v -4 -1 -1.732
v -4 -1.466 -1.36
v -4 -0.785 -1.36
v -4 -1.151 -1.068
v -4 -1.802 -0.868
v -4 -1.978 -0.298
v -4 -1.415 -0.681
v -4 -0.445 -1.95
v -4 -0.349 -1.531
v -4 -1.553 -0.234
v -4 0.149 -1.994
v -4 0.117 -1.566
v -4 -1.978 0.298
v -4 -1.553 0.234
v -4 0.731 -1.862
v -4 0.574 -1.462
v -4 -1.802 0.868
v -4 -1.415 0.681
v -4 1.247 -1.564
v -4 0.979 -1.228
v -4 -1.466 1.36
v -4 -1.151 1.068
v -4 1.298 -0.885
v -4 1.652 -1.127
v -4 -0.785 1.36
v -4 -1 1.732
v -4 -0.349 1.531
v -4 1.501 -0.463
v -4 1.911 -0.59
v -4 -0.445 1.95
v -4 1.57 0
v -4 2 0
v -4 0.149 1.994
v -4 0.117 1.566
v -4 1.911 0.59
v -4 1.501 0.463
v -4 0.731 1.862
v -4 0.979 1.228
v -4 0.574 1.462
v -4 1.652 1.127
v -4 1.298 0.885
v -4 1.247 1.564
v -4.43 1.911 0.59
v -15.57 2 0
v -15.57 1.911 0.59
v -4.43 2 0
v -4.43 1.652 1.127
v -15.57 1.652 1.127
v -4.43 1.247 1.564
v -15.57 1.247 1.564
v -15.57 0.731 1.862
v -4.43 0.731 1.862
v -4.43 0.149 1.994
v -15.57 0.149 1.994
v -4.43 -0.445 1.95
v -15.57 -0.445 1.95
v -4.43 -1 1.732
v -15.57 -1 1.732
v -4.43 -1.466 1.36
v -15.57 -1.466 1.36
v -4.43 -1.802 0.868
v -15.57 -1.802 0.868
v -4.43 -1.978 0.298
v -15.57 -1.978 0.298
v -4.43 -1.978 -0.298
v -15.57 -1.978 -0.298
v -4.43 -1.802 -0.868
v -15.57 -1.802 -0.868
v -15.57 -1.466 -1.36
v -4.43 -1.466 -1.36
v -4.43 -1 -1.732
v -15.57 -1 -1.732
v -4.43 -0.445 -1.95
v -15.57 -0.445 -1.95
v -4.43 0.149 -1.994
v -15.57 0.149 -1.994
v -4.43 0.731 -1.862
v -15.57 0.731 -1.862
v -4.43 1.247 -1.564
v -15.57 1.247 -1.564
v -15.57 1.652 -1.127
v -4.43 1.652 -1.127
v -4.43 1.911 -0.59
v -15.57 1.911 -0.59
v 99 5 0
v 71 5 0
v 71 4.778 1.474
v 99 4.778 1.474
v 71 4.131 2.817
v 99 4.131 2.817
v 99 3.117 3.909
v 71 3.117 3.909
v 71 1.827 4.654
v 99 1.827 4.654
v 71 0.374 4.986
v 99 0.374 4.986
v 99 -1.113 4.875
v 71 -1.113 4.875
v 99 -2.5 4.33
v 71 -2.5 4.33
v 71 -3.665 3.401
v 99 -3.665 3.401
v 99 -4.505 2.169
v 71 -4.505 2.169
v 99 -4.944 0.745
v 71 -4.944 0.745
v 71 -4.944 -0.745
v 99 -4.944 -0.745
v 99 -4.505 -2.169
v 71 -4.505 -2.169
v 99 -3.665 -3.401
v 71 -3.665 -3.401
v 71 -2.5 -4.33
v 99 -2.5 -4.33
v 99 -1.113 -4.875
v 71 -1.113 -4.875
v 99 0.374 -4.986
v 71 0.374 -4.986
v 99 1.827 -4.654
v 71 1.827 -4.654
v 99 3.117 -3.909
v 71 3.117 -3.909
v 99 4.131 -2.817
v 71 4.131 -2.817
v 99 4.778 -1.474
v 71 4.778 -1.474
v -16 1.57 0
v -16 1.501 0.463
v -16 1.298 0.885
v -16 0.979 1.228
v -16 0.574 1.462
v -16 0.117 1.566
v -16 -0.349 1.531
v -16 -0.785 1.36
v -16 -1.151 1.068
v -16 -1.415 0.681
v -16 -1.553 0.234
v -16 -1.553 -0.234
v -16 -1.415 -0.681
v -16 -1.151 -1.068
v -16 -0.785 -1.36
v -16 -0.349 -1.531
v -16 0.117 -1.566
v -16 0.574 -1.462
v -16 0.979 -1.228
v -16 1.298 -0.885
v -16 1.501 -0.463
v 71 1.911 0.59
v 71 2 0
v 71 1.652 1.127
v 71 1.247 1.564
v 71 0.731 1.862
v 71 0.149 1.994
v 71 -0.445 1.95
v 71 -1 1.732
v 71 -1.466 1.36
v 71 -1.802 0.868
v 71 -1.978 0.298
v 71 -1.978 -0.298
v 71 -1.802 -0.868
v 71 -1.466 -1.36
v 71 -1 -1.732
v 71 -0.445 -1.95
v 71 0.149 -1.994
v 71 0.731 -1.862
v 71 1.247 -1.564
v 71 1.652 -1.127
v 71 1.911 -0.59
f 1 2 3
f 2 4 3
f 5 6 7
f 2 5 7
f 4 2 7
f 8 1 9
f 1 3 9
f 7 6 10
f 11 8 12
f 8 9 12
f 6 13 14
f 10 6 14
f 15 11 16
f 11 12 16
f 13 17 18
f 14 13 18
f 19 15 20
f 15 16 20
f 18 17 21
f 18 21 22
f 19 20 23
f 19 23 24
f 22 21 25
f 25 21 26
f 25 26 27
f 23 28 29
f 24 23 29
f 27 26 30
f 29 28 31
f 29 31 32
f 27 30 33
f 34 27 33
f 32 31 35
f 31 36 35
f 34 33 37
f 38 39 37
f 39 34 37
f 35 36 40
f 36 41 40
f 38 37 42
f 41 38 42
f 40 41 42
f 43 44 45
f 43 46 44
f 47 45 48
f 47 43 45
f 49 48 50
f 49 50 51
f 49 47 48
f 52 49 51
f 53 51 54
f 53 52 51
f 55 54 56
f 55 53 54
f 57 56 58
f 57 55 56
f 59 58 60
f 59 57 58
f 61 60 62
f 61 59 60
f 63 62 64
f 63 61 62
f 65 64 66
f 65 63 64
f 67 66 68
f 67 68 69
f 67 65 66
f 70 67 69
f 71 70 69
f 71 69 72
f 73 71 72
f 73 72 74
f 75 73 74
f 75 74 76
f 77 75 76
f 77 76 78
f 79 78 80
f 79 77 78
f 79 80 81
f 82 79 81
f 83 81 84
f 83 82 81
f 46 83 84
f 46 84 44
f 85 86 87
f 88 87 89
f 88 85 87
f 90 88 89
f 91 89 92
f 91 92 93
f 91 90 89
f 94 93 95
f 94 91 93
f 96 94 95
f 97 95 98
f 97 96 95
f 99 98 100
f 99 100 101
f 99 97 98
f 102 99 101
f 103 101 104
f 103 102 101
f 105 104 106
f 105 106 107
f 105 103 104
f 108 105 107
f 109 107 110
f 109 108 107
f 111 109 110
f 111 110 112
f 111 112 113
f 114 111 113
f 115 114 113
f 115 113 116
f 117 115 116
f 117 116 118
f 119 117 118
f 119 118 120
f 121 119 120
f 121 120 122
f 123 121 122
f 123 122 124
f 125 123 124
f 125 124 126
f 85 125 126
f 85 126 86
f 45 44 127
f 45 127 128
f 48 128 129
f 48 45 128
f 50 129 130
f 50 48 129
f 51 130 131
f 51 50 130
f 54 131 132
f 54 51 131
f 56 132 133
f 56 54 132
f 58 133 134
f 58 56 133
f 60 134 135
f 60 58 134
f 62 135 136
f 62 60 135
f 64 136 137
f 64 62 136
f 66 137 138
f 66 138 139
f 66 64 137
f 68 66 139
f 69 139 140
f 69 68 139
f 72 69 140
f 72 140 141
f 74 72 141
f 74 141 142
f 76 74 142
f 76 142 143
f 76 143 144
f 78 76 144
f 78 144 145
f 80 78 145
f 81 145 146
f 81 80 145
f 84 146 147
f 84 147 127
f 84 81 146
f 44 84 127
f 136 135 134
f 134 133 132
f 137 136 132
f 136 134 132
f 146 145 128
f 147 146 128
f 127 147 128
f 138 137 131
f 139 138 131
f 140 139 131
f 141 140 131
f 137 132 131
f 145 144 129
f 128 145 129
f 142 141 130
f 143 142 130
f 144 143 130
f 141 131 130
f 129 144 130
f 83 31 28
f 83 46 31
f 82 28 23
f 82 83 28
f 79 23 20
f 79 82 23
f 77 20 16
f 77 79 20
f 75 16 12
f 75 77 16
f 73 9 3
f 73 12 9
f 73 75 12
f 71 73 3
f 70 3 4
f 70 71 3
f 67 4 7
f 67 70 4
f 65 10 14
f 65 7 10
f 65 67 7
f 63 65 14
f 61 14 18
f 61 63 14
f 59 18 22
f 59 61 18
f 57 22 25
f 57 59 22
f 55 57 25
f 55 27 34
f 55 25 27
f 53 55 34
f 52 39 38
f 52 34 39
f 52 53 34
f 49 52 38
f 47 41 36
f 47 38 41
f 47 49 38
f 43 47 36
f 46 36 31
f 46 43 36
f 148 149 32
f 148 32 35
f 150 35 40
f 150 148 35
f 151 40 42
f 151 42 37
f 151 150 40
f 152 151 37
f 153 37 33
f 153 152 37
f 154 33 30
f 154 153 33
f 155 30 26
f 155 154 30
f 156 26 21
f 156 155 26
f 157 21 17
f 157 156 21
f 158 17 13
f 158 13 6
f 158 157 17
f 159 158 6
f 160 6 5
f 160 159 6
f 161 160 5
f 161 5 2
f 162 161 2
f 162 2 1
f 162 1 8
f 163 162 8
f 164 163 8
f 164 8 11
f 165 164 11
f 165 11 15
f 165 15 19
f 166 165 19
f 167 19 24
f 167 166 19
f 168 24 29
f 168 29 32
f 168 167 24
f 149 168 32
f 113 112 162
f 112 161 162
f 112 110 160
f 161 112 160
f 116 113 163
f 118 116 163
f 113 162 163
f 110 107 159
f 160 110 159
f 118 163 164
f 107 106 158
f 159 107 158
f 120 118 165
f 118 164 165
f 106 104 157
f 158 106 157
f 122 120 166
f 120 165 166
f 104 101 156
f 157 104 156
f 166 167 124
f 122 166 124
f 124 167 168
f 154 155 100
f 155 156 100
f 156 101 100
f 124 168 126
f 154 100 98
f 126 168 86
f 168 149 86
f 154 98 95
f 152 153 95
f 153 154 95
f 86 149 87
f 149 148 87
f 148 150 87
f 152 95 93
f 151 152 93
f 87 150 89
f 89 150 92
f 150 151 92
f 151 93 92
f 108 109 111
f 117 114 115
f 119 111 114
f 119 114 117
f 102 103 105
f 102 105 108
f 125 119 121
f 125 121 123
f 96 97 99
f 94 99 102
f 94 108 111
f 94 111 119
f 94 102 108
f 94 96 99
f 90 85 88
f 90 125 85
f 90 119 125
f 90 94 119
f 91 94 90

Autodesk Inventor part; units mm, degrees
sketch "Sketch_1" plane through (0, 0, 0) normal (0, 0, 1) x (1, 0, 0)
  line L0 (99, 0) -> (-4, 0)
  line L1 (-4, 0) -> (-4, 2)
  line L2 (-4, 2) -> (71, 2)
  line L3 (71, 2) -> (71, 5)
  line L4 (71, 5) -> (99, 5)
  line L5 (99, 5) -> (99, 0)
  line L6 (99, 0) -> (-4, 0)
revolve "Revolution1" add sketch "Sketch_1" angle 360 about axis through (99, 0, 0) along (1, 0, 0)
sketch "Sketch_2" plane through (0, 0, 0) normal (0, 0, 1) x (1, 0, 0)
  line L0 (-4, 0) -> (-16, 0)
  line L1 (-16, 0) -> (-16, 1.5705)
  line L2 (-16, 1.5705) -> (-15.5705, 2)
  line L3 (-15.5705, 2) -> (-4.4295, 2)
  line L4 (-4.4295, 2) -> (-4, 1.5705)
  line L5 (-4, 1.5705) -> (-4, 0)
  line L6 (-4, 0) -> (-16, 0)
revolve "Revolution2" add sketch "Sketch_2" angle 360 about axis through (-4, 0, 0) along (1, 0, 0)
thread "Thread1" size "M4x0.7" class "6g" standard "ISO Metric profile" full length
ref_plane "N_XY" through (-10, 0, 0) normal (-1, 0, 0) x (0, 0, -1)
ref_plane "N_YZ" through (-10, 0, 0) normal (0, 0, -1) x (0, -1, 0)
ref_plane "N_ZX" through (-10, 0, 0) normal (0, -1, 0) x (-1, 0, 0)
ref_plane "N2_XY" through (174, 0, 0) normal (1, 0, 0) x (0, 0, -1)
ref_plane "N2_YZ" through (174, 0, 0) normal (0, 0, -1) x (0, 1, 0)
ref_plane "N2_ZX" through (174, 0, 0) normal (0, 1, 0) x (1, 0, 0)
ref_plane "P_XY" through (0, 0, 0) normal (1, 0, 0) x (0, 0, -1)
ref_plane "P_YZ" through (0, 0, 0) normal (0, 0, -1) x (0, 1, 0)
ref_plane "P_ZX" through (0, 0, 0) normal (0, 1, 0) x (1, 0, 0)
ref_plane "dim_am1_XY" through (-16, 1.5705, 0) normal (0, 0, 1) x (1, 0, 0)
ref_plane "dim_am1_YZ" through (-16, 1.5705, 0) normal (1, 0, 0) x (0, 1, 0)
ref_plane "dim_am1_ZX" through (-16, 1.5705, 0) normal (0, 1, 0) x (0, 0, 1)
ref_plane "dim_am2_XY" through (-4, 1.5705, 0) normal (0, 0, 1) x (1, 0, 0)
ref_plane "dim_am2_YZ" through (-4, 1.5705, 0) normal (1, 0, 0) x (0, 1, 0)
ref_plane "dim_am2_ZX" through (-4, 1.5705, 0) normal (0, 1, 0) x (0, 0, 1)
ref_plane "dim_bs1_XY" through (71, 5, 0) normal (0, 0, 1) x (1, 0, 0)
ref_plane "dim_bs1_YZ" through (71, 5, 0) normal (1, 0, 0) x (0, 1, 0)
ref_plane "dim_bs1_ZX" through (71, 5, 0) normal (0, 1, 0) x (0, 0, 1)
ref_plane "dim_bs2_XY" through (71, -5, 0) normal (0, 0, 1) x (1, 0, 0)
ref_plane "dim_bs2_YZ" through (71, -5, 0) normal (1, 0, 0) x (0, 1, 0)
ref_plane "dim_bs2_ZX" through (71, -5, 0) normal (0, 1, 0) x (0, 0, 1)
ref_plane "dim_mm1_XY" through (-4, 2, 0) normal (0, 0, 1) x (1, 0, 0)
ref_plane "dim_mm1_YZ" through (-4, 2, 0) normal (1, 0, 0) x (0, 1, 0)
ref_plane "dim_mm1_ZX" through (-4, 2, 0) normal (0, 1, 0) x (0, 0, 1)
ref_plane "dim_mm2_XY" through (-4, -2, 0) normal (0, 0, 1) x (1, 0, 0)
ref_plane "dim_mm2_YZ" through (-4, -2, 0) normal (1, 0, 0) x (0, 1, 0)
ref_plane "dim_mm2_ZX" through (-4, -2, 0) normal (0, 1, 0) x (0, 0, 1)
properties part number "RM/8010/M/50_0_0_P"
